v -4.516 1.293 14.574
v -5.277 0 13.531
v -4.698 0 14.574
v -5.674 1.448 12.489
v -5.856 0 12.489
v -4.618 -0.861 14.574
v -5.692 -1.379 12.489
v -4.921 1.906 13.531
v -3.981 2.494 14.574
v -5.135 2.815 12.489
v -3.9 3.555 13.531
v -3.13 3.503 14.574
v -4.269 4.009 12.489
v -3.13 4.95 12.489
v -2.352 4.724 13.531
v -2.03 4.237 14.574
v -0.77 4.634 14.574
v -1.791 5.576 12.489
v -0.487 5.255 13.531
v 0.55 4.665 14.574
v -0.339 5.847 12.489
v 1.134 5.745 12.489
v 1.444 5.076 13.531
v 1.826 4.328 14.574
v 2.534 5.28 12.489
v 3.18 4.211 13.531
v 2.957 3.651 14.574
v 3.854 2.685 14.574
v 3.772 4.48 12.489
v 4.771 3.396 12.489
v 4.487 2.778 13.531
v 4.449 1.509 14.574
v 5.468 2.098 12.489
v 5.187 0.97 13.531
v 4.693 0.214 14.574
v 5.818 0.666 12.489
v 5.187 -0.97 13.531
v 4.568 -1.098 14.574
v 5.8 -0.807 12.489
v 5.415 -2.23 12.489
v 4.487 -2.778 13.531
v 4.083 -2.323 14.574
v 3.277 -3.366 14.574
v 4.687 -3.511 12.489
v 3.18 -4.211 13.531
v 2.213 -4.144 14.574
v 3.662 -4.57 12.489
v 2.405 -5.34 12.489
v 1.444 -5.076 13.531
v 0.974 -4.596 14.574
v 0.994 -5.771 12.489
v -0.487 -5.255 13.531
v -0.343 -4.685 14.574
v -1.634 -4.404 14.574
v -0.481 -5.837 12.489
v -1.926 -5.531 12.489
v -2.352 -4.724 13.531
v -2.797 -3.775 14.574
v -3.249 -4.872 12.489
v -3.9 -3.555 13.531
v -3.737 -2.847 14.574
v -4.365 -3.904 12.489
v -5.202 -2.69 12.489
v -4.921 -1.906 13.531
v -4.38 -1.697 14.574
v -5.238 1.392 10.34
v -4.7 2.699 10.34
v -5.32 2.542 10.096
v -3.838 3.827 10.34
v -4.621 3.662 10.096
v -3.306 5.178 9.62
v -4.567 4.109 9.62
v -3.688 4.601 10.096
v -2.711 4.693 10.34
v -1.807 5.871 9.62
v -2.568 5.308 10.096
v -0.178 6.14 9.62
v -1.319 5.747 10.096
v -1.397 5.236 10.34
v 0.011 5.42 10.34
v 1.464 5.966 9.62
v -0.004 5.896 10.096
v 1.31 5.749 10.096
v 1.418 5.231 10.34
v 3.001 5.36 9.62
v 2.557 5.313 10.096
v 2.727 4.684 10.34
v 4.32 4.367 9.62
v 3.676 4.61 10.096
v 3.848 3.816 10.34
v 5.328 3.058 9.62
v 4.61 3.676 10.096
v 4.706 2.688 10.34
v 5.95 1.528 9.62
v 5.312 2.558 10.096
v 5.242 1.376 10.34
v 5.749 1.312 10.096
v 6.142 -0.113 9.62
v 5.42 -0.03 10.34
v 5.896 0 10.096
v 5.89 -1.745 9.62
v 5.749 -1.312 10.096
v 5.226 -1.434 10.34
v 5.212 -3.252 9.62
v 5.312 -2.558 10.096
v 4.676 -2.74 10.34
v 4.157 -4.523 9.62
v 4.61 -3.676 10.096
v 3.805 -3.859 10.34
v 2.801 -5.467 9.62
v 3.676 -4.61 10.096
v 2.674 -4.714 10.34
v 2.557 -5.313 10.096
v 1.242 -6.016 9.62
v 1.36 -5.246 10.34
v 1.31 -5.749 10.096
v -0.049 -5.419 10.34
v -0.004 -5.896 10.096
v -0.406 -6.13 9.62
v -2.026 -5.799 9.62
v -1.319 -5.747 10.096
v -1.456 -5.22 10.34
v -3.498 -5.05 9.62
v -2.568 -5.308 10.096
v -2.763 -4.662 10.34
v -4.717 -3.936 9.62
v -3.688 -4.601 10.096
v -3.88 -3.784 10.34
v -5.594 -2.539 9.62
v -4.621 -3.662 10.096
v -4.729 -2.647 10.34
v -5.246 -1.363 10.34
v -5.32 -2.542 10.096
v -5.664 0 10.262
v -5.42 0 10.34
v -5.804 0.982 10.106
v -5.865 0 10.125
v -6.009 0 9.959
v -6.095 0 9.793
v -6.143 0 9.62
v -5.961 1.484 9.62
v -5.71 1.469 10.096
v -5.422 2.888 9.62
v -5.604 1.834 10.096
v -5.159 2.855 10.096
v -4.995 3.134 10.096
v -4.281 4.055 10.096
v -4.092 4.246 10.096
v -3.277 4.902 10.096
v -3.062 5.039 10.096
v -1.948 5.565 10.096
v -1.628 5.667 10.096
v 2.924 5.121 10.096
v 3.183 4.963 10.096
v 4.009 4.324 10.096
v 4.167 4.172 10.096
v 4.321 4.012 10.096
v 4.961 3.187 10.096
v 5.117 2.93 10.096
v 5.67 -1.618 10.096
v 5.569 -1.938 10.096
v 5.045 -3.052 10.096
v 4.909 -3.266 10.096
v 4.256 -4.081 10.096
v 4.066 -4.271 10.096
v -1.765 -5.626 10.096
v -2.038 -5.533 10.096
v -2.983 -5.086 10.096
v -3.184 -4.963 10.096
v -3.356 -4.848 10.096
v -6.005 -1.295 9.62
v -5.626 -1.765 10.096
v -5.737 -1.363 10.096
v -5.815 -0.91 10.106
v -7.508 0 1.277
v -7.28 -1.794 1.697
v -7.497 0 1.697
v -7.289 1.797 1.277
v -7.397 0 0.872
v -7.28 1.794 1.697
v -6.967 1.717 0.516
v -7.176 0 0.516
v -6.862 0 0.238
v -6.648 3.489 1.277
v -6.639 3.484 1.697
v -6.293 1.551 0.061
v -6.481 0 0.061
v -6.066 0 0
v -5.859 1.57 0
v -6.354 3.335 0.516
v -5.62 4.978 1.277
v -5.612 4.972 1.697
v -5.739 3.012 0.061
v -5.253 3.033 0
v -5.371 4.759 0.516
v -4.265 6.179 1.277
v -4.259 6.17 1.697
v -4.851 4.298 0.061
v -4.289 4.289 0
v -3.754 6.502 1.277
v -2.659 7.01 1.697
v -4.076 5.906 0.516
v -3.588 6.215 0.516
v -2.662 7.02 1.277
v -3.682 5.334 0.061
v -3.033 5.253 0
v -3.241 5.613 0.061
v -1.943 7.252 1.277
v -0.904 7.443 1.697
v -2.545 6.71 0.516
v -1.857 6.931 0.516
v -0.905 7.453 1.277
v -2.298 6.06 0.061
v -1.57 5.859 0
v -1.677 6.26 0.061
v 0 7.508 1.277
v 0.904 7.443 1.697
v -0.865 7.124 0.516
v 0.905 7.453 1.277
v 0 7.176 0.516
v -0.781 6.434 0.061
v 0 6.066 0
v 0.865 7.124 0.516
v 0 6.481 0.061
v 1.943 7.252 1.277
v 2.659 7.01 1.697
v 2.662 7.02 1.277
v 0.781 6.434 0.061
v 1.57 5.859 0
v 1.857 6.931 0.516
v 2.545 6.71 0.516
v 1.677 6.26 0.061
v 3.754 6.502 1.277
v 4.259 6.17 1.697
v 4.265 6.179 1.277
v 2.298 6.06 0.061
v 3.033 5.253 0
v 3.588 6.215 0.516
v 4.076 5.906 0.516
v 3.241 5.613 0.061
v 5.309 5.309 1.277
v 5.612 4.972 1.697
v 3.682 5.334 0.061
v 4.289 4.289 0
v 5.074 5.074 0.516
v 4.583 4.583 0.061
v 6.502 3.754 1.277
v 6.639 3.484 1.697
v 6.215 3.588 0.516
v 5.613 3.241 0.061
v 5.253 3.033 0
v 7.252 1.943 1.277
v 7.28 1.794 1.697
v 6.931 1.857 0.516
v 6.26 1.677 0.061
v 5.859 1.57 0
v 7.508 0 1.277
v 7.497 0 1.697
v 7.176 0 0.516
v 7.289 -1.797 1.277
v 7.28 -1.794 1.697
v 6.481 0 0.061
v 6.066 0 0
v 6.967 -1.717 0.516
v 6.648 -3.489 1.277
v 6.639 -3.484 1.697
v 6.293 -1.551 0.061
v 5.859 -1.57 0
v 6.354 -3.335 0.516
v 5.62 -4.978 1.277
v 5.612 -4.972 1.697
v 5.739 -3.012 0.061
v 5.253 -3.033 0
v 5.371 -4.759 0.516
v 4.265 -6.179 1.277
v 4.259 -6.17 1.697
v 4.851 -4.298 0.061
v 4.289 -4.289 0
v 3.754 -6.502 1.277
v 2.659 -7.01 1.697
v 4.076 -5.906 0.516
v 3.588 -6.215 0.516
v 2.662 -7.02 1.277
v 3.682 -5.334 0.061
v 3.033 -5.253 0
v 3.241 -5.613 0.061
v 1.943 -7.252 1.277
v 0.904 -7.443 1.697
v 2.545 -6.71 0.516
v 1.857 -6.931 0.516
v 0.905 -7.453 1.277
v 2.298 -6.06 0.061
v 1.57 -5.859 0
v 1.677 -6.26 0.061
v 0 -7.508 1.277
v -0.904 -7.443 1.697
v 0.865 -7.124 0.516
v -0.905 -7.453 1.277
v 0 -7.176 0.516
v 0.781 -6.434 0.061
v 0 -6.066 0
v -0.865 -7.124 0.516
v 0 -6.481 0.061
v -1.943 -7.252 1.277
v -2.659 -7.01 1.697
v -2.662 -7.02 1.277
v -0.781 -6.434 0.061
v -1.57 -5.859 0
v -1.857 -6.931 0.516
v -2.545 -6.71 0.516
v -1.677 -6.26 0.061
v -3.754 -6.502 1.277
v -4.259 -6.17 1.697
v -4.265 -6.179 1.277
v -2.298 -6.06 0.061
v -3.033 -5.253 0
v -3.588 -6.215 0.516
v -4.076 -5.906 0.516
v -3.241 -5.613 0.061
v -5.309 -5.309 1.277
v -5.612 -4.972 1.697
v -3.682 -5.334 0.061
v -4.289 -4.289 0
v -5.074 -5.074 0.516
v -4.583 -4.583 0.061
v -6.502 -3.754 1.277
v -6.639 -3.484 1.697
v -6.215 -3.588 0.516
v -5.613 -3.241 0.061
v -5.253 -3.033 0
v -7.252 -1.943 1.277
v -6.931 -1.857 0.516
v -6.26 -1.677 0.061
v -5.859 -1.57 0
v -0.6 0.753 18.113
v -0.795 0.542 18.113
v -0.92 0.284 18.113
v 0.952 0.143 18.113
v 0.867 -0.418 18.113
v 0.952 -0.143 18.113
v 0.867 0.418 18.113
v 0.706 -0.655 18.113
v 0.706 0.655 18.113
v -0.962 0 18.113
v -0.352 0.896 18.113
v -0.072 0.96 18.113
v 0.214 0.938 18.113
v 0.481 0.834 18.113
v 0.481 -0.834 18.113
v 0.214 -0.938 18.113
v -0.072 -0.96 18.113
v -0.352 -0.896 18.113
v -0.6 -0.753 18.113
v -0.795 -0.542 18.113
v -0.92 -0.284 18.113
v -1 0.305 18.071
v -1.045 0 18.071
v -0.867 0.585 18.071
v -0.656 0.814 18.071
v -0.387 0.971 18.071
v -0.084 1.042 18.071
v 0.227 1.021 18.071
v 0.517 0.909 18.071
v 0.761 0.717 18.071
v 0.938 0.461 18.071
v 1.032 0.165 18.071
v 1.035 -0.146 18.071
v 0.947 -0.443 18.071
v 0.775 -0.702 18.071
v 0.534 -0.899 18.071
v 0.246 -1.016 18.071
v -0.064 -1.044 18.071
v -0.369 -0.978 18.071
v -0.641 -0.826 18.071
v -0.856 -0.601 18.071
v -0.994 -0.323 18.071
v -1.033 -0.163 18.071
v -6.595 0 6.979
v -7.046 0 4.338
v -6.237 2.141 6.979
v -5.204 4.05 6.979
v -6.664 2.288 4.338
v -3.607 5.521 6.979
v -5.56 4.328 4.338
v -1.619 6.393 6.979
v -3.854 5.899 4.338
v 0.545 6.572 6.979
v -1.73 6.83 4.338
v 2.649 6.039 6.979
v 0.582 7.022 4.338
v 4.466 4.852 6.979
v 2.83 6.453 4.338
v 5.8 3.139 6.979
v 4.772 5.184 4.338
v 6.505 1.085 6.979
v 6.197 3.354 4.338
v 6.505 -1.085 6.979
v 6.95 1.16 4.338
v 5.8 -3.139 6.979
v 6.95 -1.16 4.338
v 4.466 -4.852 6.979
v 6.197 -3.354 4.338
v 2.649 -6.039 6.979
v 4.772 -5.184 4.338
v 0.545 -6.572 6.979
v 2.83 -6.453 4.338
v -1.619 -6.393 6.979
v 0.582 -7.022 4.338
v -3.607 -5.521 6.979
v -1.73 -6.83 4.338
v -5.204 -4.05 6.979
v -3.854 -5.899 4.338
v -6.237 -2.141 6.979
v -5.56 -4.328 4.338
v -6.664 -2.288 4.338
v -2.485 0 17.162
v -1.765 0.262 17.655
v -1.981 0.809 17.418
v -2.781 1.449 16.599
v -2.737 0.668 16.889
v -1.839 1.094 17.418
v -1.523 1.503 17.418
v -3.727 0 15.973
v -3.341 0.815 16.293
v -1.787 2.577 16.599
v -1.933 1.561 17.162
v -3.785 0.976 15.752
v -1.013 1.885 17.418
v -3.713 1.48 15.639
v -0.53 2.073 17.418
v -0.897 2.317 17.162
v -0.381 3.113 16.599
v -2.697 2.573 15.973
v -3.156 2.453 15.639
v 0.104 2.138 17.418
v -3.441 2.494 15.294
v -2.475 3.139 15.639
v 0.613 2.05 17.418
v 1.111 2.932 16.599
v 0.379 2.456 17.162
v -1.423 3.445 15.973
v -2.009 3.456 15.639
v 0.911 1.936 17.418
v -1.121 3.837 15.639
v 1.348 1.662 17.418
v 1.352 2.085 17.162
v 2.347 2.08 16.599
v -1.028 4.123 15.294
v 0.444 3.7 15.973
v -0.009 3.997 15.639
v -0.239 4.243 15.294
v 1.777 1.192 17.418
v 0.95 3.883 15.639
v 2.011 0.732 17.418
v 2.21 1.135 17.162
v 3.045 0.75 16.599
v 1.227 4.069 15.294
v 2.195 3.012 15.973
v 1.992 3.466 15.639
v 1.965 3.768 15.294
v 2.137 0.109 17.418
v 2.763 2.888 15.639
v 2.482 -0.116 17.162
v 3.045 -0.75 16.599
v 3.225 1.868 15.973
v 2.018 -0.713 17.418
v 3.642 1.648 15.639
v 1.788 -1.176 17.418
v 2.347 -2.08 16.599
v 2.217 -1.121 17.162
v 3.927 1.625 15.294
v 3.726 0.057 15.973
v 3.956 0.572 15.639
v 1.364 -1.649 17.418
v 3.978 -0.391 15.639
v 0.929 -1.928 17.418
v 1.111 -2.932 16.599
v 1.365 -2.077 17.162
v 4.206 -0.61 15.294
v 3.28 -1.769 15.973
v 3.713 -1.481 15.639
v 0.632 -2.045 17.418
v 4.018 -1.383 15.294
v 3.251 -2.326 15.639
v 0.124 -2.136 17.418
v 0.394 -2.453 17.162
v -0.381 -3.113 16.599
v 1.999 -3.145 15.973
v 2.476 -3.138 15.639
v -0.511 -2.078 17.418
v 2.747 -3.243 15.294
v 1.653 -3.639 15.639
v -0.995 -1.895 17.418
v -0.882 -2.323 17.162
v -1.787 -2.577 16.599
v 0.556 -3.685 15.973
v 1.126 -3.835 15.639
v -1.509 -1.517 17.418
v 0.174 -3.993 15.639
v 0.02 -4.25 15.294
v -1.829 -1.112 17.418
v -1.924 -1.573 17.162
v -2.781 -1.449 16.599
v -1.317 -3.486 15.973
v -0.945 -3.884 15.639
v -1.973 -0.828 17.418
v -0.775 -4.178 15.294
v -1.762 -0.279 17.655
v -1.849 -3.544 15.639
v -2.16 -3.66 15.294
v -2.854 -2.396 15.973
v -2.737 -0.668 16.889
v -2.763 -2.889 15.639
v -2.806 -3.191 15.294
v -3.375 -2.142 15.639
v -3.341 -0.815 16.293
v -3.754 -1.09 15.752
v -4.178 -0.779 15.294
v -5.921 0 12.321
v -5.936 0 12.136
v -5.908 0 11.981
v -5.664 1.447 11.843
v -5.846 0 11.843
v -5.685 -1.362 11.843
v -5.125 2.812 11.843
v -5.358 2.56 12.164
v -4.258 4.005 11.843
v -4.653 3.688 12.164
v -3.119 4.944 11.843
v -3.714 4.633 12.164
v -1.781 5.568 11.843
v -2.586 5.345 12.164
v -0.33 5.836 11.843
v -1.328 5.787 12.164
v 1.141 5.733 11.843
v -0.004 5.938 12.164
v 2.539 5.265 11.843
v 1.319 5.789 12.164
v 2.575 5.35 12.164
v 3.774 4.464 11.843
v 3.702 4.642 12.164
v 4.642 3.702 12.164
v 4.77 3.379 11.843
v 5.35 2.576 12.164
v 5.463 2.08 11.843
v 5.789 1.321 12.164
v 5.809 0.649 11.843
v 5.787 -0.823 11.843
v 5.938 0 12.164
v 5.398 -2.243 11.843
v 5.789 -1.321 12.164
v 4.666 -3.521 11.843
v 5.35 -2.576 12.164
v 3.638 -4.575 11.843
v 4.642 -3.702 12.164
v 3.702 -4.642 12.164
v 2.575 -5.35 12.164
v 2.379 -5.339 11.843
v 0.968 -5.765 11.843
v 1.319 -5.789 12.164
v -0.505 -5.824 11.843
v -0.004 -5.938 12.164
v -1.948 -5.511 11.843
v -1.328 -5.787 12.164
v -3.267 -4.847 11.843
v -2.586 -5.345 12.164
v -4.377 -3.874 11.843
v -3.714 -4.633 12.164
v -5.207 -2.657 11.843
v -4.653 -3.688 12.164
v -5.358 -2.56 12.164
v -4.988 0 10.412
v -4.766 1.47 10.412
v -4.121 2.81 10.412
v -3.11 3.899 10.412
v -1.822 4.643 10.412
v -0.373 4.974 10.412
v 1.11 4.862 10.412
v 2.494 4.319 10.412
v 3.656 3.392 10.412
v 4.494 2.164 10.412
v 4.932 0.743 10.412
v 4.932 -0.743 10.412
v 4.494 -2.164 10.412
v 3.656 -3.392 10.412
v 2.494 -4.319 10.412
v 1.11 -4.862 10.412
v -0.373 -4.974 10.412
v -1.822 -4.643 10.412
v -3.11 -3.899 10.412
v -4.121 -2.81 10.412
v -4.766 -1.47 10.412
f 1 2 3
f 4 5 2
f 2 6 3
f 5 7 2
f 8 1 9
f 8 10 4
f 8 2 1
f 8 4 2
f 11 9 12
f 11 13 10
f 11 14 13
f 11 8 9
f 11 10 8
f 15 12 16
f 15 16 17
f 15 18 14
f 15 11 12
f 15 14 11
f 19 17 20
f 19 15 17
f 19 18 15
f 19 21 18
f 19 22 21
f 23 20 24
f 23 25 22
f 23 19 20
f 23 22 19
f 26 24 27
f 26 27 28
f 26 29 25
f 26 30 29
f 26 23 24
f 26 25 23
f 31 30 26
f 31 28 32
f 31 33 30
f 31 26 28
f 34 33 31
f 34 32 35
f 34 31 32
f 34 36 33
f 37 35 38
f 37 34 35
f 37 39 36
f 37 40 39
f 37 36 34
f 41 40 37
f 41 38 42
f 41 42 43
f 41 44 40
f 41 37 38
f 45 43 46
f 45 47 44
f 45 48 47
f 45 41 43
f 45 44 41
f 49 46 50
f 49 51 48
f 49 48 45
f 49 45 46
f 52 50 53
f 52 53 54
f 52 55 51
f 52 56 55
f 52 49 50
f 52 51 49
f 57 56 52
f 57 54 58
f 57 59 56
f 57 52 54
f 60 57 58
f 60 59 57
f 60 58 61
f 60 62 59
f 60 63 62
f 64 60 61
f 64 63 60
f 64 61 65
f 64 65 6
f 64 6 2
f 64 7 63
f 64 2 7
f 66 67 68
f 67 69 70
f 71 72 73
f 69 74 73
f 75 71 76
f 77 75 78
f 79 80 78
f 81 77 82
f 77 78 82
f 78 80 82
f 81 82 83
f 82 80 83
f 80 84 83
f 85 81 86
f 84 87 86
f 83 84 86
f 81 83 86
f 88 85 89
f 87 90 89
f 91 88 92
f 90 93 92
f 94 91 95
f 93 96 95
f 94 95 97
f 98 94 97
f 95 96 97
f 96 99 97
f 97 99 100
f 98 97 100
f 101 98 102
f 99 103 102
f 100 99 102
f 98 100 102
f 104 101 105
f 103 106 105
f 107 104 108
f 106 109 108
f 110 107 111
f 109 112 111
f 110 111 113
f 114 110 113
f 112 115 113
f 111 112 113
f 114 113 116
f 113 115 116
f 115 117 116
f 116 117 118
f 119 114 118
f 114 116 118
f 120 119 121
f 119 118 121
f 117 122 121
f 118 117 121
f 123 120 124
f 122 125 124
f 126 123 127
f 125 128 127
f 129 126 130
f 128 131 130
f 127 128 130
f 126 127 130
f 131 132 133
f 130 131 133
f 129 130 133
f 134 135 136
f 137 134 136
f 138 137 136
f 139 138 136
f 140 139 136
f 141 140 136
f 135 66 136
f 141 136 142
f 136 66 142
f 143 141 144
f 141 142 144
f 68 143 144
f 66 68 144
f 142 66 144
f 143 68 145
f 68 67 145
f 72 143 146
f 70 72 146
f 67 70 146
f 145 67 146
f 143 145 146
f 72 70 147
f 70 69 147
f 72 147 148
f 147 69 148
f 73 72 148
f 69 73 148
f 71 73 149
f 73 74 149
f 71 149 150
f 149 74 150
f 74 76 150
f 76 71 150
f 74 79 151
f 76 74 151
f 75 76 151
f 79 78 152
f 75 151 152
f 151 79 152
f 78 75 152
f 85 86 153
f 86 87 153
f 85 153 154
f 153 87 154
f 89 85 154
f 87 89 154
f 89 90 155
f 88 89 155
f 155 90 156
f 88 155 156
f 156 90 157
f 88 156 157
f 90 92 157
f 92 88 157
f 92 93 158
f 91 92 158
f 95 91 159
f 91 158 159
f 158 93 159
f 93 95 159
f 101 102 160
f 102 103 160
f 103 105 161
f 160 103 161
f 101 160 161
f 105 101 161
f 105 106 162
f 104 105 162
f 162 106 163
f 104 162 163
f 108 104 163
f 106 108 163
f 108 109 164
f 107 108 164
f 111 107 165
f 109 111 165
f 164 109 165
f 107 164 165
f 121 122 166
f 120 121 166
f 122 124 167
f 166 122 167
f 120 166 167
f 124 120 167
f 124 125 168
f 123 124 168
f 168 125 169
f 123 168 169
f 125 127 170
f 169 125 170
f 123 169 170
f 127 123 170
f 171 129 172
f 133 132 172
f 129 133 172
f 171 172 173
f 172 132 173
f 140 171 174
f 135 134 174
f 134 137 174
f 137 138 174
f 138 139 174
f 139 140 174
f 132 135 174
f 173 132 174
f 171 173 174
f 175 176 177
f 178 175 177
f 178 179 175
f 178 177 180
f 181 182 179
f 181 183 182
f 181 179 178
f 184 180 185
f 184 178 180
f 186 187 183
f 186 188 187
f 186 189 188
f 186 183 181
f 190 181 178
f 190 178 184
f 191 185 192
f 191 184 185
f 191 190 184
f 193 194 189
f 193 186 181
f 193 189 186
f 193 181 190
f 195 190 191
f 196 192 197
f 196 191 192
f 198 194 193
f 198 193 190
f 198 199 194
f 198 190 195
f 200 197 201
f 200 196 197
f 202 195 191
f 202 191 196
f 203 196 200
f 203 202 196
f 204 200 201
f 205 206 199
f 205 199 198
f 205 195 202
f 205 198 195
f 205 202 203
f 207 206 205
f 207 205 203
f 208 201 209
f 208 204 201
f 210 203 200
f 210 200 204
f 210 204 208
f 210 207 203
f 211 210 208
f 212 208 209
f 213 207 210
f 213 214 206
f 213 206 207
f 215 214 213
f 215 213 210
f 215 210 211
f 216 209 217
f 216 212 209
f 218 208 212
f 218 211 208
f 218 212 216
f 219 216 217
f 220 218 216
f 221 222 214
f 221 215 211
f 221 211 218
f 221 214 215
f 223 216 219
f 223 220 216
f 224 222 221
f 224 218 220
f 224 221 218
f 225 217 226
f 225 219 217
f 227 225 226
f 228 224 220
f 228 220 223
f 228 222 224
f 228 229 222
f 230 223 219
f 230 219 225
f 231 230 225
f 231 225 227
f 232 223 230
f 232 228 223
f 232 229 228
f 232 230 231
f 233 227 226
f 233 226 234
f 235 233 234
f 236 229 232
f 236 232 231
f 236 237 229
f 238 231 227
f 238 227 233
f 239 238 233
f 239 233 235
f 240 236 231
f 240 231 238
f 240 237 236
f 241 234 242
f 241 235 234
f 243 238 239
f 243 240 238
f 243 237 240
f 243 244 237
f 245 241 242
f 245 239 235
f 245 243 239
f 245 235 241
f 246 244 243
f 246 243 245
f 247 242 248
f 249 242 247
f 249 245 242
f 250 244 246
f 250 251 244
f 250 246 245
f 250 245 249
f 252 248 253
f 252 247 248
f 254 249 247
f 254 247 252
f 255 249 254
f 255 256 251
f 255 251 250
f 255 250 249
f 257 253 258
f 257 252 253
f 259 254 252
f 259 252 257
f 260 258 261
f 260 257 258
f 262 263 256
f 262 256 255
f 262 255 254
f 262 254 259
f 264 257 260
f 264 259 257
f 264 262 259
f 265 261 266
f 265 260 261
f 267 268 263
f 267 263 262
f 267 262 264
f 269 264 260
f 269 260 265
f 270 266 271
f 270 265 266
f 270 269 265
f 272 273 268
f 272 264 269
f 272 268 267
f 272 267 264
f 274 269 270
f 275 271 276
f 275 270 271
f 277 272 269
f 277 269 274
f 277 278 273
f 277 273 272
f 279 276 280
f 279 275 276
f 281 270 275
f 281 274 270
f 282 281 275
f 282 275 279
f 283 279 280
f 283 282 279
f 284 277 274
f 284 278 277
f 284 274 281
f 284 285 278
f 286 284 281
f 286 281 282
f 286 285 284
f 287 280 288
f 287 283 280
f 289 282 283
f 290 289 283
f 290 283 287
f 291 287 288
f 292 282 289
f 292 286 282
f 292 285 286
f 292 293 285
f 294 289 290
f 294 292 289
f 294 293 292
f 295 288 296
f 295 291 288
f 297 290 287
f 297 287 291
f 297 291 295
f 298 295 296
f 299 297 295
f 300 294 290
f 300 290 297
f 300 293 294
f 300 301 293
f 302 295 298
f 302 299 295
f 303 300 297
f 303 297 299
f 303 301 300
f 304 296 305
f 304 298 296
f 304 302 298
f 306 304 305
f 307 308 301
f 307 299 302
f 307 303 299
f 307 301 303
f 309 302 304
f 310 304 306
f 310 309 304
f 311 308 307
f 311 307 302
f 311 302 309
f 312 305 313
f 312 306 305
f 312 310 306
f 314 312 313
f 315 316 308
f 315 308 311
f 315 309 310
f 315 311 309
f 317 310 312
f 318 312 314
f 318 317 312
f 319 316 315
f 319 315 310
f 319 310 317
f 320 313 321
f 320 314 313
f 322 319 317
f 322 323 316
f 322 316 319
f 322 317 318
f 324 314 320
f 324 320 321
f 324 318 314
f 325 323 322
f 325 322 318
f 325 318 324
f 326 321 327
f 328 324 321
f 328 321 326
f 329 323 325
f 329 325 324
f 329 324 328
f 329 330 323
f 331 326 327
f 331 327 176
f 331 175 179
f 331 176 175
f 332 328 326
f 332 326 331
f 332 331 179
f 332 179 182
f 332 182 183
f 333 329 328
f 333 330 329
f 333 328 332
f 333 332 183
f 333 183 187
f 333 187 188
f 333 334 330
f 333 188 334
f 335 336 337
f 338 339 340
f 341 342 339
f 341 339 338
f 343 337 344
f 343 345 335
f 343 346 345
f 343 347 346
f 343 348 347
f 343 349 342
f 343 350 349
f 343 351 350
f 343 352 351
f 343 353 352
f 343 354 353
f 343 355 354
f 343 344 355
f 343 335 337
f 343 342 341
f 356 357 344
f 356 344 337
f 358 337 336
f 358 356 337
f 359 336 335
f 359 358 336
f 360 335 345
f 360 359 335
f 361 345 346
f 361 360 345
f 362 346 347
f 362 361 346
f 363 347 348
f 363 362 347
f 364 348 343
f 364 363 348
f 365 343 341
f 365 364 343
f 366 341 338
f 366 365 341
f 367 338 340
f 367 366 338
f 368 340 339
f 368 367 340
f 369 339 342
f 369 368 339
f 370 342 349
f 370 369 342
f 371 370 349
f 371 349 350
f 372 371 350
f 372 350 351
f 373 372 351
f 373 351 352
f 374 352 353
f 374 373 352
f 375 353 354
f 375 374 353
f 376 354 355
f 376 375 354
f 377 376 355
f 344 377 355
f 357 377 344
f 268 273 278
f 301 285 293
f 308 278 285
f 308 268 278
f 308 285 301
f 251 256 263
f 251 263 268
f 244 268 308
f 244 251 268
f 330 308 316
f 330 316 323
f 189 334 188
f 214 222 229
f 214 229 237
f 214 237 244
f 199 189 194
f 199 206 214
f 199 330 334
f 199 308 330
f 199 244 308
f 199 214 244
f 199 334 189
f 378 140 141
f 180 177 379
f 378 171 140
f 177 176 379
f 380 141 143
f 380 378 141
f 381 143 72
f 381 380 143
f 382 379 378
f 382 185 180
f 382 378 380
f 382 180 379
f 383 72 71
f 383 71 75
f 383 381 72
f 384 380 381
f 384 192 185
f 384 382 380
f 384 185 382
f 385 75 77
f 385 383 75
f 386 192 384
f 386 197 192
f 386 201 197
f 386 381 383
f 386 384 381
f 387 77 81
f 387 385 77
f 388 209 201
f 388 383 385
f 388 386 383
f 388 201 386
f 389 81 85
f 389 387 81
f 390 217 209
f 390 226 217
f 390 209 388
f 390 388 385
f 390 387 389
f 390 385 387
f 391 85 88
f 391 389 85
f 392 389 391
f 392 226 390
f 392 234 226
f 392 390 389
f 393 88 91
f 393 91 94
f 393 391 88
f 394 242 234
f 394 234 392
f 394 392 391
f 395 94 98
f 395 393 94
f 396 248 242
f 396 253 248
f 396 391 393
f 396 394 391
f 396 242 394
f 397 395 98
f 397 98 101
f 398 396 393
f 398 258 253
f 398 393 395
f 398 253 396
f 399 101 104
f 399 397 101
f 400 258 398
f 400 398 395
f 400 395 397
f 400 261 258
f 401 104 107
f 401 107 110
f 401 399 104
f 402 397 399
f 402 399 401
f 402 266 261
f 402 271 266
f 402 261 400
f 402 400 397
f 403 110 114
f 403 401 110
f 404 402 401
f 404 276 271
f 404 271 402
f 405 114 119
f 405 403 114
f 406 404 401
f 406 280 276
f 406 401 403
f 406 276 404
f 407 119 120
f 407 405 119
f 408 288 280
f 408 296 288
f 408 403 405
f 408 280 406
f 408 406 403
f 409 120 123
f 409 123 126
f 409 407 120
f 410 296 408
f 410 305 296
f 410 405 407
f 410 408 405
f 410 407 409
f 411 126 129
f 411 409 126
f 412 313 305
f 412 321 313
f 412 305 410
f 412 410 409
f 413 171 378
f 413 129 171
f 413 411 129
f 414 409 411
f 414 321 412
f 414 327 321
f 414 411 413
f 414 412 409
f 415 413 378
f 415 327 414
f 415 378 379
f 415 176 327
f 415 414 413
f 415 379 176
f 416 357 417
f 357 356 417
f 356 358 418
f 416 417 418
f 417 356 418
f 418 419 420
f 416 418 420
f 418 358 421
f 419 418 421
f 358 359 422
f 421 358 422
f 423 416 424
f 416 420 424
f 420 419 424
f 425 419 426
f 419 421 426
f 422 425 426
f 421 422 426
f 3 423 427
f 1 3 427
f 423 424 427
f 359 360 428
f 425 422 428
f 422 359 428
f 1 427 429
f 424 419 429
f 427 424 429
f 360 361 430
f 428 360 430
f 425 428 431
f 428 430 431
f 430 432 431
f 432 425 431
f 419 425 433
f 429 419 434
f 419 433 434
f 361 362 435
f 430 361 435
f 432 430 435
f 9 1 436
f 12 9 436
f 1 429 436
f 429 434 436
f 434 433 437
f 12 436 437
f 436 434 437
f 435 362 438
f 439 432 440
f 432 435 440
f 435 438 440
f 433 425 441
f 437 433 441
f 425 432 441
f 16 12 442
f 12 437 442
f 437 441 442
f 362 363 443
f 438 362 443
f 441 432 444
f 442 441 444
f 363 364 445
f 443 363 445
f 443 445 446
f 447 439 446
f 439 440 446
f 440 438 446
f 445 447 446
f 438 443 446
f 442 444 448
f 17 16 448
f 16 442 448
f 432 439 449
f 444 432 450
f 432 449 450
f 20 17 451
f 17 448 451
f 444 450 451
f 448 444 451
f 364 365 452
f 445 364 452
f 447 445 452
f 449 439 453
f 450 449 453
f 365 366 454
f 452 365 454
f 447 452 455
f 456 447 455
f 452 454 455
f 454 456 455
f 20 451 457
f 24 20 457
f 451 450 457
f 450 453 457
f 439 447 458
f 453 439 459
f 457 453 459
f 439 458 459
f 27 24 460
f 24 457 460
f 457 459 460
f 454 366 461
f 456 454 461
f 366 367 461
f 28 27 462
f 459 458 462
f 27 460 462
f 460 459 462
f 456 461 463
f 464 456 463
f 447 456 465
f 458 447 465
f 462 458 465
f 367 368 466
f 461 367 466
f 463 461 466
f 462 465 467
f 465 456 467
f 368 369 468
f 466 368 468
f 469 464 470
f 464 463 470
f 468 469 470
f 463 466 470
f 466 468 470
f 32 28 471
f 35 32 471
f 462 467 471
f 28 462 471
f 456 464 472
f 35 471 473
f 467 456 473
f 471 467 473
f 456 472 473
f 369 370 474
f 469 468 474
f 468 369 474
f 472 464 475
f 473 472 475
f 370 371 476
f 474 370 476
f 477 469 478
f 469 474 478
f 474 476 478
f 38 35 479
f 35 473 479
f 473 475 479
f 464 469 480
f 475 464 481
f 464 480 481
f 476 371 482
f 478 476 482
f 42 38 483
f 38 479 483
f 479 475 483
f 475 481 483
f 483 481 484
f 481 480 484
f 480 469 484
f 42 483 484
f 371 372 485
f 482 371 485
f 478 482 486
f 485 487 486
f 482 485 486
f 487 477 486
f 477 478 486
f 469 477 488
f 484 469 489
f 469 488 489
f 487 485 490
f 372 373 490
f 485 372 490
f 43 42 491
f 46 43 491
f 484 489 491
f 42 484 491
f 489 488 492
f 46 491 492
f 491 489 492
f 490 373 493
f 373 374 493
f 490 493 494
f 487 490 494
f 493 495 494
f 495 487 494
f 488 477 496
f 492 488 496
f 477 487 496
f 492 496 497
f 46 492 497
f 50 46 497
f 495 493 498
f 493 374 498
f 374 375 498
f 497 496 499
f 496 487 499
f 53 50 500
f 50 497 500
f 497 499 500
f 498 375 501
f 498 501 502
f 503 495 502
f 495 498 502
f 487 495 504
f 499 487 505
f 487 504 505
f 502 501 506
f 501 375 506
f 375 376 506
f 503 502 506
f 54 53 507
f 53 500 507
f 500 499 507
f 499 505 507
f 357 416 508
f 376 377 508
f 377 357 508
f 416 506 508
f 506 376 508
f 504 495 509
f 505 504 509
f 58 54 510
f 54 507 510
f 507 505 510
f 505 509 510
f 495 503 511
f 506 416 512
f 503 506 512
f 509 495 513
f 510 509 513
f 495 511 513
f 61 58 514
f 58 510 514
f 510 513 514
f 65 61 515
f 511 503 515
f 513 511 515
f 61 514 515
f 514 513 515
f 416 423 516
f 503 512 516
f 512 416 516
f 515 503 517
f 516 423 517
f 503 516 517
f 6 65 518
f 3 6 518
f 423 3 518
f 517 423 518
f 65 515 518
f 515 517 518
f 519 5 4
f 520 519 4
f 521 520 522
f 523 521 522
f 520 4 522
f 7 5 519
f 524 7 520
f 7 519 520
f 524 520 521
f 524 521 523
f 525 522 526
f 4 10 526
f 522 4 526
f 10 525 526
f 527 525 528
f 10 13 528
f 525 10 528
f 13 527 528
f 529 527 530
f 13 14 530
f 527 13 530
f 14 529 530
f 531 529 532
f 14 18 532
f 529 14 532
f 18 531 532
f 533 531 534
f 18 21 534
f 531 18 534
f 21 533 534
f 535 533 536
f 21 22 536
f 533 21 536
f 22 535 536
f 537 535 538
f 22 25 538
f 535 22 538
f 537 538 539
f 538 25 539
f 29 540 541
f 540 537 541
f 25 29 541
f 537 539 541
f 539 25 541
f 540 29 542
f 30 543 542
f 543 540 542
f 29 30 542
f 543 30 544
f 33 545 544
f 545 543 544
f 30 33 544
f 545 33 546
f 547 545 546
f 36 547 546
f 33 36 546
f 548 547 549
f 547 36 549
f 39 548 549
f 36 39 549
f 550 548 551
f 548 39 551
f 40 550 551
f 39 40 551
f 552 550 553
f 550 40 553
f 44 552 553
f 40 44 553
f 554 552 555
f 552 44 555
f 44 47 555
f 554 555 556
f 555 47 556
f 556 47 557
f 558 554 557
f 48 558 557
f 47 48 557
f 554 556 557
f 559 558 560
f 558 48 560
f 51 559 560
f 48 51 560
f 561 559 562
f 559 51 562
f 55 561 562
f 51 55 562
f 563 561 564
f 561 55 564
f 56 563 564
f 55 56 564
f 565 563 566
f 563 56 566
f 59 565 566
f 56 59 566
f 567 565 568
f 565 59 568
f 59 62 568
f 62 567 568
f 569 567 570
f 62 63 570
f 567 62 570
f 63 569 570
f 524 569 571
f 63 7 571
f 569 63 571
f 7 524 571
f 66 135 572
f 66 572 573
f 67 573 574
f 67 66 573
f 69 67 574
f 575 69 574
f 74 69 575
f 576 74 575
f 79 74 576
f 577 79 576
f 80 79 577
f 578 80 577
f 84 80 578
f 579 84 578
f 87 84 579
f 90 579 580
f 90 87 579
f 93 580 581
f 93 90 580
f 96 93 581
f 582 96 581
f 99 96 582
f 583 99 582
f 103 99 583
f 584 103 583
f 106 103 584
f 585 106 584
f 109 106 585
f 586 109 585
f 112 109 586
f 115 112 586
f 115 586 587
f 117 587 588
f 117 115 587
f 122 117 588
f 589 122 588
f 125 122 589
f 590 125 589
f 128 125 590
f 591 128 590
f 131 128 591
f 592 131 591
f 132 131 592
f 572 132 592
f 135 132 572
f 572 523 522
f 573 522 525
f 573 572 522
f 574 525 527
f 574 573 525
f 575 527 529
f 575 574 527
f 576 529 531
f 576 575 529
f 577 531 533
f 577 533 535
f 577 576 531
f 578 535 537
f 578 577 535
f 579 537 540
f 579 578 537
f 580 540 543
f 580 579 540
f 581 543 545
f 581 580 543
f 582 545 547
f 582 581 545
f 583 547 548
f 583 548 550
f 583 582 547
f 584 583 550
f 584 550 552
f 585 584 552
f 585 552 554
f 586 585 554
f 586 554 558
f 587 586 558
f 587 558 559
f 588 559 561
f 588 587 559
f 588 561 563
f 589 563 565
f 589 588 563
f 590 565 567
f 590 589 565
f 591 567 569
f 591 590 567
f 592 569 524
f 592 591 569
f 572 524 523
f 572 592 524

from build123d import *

# Parameters (mm, degrees)
F2_R = 8.554368
F3_R = 0.645964
F4_R = 0.880727
F5_R = 1.452178


with BuildPart() as f1:
    # F0 (on Front) → F1 (revolve)
    with BuildSketch(Plane.XZ):
        Polygon((-7.7875, 0), (0, 0), (0, 18.112501), (-0.9625, 18.112501), (-3.4125, 16.887501), (-6.0375, 12.1625), (-4.9875, 10.4125), (-6.0375, 10.2375), align=None)
    revolve(axis=Axis((0, 0, 9.056251), (0, 0, -1)))

    # F2
    f2_edges = [f1.edges().sort_by_distance(p)[0] for p in [
        (3.4125, 0, 16.887501),
    ]]
    fillet(f2_edges, radius=F2_R)

    # F3
    f3_edges = [f1.edges().sort_by_distance(p)[0] for p in [
        (6.0375, 0, 12.1625),
    ]]
    fillet(f3_edges, radius=F3_R)

    # F4
    f4_edges = [f1.edges().sort_by_distance(p)[0] for p in [
        (6.0375, 0, 10.2375),
    ]]
    fillet(f4_edges, radius=F4_R)

    # F5
    f5_edges = [f1.edges().sort_by_distance(p)[0] for p in [
        (7.7875, 0, 0),
    ]]
    fillet(f5_edges, radius=F5_R)


solid = f1.part
